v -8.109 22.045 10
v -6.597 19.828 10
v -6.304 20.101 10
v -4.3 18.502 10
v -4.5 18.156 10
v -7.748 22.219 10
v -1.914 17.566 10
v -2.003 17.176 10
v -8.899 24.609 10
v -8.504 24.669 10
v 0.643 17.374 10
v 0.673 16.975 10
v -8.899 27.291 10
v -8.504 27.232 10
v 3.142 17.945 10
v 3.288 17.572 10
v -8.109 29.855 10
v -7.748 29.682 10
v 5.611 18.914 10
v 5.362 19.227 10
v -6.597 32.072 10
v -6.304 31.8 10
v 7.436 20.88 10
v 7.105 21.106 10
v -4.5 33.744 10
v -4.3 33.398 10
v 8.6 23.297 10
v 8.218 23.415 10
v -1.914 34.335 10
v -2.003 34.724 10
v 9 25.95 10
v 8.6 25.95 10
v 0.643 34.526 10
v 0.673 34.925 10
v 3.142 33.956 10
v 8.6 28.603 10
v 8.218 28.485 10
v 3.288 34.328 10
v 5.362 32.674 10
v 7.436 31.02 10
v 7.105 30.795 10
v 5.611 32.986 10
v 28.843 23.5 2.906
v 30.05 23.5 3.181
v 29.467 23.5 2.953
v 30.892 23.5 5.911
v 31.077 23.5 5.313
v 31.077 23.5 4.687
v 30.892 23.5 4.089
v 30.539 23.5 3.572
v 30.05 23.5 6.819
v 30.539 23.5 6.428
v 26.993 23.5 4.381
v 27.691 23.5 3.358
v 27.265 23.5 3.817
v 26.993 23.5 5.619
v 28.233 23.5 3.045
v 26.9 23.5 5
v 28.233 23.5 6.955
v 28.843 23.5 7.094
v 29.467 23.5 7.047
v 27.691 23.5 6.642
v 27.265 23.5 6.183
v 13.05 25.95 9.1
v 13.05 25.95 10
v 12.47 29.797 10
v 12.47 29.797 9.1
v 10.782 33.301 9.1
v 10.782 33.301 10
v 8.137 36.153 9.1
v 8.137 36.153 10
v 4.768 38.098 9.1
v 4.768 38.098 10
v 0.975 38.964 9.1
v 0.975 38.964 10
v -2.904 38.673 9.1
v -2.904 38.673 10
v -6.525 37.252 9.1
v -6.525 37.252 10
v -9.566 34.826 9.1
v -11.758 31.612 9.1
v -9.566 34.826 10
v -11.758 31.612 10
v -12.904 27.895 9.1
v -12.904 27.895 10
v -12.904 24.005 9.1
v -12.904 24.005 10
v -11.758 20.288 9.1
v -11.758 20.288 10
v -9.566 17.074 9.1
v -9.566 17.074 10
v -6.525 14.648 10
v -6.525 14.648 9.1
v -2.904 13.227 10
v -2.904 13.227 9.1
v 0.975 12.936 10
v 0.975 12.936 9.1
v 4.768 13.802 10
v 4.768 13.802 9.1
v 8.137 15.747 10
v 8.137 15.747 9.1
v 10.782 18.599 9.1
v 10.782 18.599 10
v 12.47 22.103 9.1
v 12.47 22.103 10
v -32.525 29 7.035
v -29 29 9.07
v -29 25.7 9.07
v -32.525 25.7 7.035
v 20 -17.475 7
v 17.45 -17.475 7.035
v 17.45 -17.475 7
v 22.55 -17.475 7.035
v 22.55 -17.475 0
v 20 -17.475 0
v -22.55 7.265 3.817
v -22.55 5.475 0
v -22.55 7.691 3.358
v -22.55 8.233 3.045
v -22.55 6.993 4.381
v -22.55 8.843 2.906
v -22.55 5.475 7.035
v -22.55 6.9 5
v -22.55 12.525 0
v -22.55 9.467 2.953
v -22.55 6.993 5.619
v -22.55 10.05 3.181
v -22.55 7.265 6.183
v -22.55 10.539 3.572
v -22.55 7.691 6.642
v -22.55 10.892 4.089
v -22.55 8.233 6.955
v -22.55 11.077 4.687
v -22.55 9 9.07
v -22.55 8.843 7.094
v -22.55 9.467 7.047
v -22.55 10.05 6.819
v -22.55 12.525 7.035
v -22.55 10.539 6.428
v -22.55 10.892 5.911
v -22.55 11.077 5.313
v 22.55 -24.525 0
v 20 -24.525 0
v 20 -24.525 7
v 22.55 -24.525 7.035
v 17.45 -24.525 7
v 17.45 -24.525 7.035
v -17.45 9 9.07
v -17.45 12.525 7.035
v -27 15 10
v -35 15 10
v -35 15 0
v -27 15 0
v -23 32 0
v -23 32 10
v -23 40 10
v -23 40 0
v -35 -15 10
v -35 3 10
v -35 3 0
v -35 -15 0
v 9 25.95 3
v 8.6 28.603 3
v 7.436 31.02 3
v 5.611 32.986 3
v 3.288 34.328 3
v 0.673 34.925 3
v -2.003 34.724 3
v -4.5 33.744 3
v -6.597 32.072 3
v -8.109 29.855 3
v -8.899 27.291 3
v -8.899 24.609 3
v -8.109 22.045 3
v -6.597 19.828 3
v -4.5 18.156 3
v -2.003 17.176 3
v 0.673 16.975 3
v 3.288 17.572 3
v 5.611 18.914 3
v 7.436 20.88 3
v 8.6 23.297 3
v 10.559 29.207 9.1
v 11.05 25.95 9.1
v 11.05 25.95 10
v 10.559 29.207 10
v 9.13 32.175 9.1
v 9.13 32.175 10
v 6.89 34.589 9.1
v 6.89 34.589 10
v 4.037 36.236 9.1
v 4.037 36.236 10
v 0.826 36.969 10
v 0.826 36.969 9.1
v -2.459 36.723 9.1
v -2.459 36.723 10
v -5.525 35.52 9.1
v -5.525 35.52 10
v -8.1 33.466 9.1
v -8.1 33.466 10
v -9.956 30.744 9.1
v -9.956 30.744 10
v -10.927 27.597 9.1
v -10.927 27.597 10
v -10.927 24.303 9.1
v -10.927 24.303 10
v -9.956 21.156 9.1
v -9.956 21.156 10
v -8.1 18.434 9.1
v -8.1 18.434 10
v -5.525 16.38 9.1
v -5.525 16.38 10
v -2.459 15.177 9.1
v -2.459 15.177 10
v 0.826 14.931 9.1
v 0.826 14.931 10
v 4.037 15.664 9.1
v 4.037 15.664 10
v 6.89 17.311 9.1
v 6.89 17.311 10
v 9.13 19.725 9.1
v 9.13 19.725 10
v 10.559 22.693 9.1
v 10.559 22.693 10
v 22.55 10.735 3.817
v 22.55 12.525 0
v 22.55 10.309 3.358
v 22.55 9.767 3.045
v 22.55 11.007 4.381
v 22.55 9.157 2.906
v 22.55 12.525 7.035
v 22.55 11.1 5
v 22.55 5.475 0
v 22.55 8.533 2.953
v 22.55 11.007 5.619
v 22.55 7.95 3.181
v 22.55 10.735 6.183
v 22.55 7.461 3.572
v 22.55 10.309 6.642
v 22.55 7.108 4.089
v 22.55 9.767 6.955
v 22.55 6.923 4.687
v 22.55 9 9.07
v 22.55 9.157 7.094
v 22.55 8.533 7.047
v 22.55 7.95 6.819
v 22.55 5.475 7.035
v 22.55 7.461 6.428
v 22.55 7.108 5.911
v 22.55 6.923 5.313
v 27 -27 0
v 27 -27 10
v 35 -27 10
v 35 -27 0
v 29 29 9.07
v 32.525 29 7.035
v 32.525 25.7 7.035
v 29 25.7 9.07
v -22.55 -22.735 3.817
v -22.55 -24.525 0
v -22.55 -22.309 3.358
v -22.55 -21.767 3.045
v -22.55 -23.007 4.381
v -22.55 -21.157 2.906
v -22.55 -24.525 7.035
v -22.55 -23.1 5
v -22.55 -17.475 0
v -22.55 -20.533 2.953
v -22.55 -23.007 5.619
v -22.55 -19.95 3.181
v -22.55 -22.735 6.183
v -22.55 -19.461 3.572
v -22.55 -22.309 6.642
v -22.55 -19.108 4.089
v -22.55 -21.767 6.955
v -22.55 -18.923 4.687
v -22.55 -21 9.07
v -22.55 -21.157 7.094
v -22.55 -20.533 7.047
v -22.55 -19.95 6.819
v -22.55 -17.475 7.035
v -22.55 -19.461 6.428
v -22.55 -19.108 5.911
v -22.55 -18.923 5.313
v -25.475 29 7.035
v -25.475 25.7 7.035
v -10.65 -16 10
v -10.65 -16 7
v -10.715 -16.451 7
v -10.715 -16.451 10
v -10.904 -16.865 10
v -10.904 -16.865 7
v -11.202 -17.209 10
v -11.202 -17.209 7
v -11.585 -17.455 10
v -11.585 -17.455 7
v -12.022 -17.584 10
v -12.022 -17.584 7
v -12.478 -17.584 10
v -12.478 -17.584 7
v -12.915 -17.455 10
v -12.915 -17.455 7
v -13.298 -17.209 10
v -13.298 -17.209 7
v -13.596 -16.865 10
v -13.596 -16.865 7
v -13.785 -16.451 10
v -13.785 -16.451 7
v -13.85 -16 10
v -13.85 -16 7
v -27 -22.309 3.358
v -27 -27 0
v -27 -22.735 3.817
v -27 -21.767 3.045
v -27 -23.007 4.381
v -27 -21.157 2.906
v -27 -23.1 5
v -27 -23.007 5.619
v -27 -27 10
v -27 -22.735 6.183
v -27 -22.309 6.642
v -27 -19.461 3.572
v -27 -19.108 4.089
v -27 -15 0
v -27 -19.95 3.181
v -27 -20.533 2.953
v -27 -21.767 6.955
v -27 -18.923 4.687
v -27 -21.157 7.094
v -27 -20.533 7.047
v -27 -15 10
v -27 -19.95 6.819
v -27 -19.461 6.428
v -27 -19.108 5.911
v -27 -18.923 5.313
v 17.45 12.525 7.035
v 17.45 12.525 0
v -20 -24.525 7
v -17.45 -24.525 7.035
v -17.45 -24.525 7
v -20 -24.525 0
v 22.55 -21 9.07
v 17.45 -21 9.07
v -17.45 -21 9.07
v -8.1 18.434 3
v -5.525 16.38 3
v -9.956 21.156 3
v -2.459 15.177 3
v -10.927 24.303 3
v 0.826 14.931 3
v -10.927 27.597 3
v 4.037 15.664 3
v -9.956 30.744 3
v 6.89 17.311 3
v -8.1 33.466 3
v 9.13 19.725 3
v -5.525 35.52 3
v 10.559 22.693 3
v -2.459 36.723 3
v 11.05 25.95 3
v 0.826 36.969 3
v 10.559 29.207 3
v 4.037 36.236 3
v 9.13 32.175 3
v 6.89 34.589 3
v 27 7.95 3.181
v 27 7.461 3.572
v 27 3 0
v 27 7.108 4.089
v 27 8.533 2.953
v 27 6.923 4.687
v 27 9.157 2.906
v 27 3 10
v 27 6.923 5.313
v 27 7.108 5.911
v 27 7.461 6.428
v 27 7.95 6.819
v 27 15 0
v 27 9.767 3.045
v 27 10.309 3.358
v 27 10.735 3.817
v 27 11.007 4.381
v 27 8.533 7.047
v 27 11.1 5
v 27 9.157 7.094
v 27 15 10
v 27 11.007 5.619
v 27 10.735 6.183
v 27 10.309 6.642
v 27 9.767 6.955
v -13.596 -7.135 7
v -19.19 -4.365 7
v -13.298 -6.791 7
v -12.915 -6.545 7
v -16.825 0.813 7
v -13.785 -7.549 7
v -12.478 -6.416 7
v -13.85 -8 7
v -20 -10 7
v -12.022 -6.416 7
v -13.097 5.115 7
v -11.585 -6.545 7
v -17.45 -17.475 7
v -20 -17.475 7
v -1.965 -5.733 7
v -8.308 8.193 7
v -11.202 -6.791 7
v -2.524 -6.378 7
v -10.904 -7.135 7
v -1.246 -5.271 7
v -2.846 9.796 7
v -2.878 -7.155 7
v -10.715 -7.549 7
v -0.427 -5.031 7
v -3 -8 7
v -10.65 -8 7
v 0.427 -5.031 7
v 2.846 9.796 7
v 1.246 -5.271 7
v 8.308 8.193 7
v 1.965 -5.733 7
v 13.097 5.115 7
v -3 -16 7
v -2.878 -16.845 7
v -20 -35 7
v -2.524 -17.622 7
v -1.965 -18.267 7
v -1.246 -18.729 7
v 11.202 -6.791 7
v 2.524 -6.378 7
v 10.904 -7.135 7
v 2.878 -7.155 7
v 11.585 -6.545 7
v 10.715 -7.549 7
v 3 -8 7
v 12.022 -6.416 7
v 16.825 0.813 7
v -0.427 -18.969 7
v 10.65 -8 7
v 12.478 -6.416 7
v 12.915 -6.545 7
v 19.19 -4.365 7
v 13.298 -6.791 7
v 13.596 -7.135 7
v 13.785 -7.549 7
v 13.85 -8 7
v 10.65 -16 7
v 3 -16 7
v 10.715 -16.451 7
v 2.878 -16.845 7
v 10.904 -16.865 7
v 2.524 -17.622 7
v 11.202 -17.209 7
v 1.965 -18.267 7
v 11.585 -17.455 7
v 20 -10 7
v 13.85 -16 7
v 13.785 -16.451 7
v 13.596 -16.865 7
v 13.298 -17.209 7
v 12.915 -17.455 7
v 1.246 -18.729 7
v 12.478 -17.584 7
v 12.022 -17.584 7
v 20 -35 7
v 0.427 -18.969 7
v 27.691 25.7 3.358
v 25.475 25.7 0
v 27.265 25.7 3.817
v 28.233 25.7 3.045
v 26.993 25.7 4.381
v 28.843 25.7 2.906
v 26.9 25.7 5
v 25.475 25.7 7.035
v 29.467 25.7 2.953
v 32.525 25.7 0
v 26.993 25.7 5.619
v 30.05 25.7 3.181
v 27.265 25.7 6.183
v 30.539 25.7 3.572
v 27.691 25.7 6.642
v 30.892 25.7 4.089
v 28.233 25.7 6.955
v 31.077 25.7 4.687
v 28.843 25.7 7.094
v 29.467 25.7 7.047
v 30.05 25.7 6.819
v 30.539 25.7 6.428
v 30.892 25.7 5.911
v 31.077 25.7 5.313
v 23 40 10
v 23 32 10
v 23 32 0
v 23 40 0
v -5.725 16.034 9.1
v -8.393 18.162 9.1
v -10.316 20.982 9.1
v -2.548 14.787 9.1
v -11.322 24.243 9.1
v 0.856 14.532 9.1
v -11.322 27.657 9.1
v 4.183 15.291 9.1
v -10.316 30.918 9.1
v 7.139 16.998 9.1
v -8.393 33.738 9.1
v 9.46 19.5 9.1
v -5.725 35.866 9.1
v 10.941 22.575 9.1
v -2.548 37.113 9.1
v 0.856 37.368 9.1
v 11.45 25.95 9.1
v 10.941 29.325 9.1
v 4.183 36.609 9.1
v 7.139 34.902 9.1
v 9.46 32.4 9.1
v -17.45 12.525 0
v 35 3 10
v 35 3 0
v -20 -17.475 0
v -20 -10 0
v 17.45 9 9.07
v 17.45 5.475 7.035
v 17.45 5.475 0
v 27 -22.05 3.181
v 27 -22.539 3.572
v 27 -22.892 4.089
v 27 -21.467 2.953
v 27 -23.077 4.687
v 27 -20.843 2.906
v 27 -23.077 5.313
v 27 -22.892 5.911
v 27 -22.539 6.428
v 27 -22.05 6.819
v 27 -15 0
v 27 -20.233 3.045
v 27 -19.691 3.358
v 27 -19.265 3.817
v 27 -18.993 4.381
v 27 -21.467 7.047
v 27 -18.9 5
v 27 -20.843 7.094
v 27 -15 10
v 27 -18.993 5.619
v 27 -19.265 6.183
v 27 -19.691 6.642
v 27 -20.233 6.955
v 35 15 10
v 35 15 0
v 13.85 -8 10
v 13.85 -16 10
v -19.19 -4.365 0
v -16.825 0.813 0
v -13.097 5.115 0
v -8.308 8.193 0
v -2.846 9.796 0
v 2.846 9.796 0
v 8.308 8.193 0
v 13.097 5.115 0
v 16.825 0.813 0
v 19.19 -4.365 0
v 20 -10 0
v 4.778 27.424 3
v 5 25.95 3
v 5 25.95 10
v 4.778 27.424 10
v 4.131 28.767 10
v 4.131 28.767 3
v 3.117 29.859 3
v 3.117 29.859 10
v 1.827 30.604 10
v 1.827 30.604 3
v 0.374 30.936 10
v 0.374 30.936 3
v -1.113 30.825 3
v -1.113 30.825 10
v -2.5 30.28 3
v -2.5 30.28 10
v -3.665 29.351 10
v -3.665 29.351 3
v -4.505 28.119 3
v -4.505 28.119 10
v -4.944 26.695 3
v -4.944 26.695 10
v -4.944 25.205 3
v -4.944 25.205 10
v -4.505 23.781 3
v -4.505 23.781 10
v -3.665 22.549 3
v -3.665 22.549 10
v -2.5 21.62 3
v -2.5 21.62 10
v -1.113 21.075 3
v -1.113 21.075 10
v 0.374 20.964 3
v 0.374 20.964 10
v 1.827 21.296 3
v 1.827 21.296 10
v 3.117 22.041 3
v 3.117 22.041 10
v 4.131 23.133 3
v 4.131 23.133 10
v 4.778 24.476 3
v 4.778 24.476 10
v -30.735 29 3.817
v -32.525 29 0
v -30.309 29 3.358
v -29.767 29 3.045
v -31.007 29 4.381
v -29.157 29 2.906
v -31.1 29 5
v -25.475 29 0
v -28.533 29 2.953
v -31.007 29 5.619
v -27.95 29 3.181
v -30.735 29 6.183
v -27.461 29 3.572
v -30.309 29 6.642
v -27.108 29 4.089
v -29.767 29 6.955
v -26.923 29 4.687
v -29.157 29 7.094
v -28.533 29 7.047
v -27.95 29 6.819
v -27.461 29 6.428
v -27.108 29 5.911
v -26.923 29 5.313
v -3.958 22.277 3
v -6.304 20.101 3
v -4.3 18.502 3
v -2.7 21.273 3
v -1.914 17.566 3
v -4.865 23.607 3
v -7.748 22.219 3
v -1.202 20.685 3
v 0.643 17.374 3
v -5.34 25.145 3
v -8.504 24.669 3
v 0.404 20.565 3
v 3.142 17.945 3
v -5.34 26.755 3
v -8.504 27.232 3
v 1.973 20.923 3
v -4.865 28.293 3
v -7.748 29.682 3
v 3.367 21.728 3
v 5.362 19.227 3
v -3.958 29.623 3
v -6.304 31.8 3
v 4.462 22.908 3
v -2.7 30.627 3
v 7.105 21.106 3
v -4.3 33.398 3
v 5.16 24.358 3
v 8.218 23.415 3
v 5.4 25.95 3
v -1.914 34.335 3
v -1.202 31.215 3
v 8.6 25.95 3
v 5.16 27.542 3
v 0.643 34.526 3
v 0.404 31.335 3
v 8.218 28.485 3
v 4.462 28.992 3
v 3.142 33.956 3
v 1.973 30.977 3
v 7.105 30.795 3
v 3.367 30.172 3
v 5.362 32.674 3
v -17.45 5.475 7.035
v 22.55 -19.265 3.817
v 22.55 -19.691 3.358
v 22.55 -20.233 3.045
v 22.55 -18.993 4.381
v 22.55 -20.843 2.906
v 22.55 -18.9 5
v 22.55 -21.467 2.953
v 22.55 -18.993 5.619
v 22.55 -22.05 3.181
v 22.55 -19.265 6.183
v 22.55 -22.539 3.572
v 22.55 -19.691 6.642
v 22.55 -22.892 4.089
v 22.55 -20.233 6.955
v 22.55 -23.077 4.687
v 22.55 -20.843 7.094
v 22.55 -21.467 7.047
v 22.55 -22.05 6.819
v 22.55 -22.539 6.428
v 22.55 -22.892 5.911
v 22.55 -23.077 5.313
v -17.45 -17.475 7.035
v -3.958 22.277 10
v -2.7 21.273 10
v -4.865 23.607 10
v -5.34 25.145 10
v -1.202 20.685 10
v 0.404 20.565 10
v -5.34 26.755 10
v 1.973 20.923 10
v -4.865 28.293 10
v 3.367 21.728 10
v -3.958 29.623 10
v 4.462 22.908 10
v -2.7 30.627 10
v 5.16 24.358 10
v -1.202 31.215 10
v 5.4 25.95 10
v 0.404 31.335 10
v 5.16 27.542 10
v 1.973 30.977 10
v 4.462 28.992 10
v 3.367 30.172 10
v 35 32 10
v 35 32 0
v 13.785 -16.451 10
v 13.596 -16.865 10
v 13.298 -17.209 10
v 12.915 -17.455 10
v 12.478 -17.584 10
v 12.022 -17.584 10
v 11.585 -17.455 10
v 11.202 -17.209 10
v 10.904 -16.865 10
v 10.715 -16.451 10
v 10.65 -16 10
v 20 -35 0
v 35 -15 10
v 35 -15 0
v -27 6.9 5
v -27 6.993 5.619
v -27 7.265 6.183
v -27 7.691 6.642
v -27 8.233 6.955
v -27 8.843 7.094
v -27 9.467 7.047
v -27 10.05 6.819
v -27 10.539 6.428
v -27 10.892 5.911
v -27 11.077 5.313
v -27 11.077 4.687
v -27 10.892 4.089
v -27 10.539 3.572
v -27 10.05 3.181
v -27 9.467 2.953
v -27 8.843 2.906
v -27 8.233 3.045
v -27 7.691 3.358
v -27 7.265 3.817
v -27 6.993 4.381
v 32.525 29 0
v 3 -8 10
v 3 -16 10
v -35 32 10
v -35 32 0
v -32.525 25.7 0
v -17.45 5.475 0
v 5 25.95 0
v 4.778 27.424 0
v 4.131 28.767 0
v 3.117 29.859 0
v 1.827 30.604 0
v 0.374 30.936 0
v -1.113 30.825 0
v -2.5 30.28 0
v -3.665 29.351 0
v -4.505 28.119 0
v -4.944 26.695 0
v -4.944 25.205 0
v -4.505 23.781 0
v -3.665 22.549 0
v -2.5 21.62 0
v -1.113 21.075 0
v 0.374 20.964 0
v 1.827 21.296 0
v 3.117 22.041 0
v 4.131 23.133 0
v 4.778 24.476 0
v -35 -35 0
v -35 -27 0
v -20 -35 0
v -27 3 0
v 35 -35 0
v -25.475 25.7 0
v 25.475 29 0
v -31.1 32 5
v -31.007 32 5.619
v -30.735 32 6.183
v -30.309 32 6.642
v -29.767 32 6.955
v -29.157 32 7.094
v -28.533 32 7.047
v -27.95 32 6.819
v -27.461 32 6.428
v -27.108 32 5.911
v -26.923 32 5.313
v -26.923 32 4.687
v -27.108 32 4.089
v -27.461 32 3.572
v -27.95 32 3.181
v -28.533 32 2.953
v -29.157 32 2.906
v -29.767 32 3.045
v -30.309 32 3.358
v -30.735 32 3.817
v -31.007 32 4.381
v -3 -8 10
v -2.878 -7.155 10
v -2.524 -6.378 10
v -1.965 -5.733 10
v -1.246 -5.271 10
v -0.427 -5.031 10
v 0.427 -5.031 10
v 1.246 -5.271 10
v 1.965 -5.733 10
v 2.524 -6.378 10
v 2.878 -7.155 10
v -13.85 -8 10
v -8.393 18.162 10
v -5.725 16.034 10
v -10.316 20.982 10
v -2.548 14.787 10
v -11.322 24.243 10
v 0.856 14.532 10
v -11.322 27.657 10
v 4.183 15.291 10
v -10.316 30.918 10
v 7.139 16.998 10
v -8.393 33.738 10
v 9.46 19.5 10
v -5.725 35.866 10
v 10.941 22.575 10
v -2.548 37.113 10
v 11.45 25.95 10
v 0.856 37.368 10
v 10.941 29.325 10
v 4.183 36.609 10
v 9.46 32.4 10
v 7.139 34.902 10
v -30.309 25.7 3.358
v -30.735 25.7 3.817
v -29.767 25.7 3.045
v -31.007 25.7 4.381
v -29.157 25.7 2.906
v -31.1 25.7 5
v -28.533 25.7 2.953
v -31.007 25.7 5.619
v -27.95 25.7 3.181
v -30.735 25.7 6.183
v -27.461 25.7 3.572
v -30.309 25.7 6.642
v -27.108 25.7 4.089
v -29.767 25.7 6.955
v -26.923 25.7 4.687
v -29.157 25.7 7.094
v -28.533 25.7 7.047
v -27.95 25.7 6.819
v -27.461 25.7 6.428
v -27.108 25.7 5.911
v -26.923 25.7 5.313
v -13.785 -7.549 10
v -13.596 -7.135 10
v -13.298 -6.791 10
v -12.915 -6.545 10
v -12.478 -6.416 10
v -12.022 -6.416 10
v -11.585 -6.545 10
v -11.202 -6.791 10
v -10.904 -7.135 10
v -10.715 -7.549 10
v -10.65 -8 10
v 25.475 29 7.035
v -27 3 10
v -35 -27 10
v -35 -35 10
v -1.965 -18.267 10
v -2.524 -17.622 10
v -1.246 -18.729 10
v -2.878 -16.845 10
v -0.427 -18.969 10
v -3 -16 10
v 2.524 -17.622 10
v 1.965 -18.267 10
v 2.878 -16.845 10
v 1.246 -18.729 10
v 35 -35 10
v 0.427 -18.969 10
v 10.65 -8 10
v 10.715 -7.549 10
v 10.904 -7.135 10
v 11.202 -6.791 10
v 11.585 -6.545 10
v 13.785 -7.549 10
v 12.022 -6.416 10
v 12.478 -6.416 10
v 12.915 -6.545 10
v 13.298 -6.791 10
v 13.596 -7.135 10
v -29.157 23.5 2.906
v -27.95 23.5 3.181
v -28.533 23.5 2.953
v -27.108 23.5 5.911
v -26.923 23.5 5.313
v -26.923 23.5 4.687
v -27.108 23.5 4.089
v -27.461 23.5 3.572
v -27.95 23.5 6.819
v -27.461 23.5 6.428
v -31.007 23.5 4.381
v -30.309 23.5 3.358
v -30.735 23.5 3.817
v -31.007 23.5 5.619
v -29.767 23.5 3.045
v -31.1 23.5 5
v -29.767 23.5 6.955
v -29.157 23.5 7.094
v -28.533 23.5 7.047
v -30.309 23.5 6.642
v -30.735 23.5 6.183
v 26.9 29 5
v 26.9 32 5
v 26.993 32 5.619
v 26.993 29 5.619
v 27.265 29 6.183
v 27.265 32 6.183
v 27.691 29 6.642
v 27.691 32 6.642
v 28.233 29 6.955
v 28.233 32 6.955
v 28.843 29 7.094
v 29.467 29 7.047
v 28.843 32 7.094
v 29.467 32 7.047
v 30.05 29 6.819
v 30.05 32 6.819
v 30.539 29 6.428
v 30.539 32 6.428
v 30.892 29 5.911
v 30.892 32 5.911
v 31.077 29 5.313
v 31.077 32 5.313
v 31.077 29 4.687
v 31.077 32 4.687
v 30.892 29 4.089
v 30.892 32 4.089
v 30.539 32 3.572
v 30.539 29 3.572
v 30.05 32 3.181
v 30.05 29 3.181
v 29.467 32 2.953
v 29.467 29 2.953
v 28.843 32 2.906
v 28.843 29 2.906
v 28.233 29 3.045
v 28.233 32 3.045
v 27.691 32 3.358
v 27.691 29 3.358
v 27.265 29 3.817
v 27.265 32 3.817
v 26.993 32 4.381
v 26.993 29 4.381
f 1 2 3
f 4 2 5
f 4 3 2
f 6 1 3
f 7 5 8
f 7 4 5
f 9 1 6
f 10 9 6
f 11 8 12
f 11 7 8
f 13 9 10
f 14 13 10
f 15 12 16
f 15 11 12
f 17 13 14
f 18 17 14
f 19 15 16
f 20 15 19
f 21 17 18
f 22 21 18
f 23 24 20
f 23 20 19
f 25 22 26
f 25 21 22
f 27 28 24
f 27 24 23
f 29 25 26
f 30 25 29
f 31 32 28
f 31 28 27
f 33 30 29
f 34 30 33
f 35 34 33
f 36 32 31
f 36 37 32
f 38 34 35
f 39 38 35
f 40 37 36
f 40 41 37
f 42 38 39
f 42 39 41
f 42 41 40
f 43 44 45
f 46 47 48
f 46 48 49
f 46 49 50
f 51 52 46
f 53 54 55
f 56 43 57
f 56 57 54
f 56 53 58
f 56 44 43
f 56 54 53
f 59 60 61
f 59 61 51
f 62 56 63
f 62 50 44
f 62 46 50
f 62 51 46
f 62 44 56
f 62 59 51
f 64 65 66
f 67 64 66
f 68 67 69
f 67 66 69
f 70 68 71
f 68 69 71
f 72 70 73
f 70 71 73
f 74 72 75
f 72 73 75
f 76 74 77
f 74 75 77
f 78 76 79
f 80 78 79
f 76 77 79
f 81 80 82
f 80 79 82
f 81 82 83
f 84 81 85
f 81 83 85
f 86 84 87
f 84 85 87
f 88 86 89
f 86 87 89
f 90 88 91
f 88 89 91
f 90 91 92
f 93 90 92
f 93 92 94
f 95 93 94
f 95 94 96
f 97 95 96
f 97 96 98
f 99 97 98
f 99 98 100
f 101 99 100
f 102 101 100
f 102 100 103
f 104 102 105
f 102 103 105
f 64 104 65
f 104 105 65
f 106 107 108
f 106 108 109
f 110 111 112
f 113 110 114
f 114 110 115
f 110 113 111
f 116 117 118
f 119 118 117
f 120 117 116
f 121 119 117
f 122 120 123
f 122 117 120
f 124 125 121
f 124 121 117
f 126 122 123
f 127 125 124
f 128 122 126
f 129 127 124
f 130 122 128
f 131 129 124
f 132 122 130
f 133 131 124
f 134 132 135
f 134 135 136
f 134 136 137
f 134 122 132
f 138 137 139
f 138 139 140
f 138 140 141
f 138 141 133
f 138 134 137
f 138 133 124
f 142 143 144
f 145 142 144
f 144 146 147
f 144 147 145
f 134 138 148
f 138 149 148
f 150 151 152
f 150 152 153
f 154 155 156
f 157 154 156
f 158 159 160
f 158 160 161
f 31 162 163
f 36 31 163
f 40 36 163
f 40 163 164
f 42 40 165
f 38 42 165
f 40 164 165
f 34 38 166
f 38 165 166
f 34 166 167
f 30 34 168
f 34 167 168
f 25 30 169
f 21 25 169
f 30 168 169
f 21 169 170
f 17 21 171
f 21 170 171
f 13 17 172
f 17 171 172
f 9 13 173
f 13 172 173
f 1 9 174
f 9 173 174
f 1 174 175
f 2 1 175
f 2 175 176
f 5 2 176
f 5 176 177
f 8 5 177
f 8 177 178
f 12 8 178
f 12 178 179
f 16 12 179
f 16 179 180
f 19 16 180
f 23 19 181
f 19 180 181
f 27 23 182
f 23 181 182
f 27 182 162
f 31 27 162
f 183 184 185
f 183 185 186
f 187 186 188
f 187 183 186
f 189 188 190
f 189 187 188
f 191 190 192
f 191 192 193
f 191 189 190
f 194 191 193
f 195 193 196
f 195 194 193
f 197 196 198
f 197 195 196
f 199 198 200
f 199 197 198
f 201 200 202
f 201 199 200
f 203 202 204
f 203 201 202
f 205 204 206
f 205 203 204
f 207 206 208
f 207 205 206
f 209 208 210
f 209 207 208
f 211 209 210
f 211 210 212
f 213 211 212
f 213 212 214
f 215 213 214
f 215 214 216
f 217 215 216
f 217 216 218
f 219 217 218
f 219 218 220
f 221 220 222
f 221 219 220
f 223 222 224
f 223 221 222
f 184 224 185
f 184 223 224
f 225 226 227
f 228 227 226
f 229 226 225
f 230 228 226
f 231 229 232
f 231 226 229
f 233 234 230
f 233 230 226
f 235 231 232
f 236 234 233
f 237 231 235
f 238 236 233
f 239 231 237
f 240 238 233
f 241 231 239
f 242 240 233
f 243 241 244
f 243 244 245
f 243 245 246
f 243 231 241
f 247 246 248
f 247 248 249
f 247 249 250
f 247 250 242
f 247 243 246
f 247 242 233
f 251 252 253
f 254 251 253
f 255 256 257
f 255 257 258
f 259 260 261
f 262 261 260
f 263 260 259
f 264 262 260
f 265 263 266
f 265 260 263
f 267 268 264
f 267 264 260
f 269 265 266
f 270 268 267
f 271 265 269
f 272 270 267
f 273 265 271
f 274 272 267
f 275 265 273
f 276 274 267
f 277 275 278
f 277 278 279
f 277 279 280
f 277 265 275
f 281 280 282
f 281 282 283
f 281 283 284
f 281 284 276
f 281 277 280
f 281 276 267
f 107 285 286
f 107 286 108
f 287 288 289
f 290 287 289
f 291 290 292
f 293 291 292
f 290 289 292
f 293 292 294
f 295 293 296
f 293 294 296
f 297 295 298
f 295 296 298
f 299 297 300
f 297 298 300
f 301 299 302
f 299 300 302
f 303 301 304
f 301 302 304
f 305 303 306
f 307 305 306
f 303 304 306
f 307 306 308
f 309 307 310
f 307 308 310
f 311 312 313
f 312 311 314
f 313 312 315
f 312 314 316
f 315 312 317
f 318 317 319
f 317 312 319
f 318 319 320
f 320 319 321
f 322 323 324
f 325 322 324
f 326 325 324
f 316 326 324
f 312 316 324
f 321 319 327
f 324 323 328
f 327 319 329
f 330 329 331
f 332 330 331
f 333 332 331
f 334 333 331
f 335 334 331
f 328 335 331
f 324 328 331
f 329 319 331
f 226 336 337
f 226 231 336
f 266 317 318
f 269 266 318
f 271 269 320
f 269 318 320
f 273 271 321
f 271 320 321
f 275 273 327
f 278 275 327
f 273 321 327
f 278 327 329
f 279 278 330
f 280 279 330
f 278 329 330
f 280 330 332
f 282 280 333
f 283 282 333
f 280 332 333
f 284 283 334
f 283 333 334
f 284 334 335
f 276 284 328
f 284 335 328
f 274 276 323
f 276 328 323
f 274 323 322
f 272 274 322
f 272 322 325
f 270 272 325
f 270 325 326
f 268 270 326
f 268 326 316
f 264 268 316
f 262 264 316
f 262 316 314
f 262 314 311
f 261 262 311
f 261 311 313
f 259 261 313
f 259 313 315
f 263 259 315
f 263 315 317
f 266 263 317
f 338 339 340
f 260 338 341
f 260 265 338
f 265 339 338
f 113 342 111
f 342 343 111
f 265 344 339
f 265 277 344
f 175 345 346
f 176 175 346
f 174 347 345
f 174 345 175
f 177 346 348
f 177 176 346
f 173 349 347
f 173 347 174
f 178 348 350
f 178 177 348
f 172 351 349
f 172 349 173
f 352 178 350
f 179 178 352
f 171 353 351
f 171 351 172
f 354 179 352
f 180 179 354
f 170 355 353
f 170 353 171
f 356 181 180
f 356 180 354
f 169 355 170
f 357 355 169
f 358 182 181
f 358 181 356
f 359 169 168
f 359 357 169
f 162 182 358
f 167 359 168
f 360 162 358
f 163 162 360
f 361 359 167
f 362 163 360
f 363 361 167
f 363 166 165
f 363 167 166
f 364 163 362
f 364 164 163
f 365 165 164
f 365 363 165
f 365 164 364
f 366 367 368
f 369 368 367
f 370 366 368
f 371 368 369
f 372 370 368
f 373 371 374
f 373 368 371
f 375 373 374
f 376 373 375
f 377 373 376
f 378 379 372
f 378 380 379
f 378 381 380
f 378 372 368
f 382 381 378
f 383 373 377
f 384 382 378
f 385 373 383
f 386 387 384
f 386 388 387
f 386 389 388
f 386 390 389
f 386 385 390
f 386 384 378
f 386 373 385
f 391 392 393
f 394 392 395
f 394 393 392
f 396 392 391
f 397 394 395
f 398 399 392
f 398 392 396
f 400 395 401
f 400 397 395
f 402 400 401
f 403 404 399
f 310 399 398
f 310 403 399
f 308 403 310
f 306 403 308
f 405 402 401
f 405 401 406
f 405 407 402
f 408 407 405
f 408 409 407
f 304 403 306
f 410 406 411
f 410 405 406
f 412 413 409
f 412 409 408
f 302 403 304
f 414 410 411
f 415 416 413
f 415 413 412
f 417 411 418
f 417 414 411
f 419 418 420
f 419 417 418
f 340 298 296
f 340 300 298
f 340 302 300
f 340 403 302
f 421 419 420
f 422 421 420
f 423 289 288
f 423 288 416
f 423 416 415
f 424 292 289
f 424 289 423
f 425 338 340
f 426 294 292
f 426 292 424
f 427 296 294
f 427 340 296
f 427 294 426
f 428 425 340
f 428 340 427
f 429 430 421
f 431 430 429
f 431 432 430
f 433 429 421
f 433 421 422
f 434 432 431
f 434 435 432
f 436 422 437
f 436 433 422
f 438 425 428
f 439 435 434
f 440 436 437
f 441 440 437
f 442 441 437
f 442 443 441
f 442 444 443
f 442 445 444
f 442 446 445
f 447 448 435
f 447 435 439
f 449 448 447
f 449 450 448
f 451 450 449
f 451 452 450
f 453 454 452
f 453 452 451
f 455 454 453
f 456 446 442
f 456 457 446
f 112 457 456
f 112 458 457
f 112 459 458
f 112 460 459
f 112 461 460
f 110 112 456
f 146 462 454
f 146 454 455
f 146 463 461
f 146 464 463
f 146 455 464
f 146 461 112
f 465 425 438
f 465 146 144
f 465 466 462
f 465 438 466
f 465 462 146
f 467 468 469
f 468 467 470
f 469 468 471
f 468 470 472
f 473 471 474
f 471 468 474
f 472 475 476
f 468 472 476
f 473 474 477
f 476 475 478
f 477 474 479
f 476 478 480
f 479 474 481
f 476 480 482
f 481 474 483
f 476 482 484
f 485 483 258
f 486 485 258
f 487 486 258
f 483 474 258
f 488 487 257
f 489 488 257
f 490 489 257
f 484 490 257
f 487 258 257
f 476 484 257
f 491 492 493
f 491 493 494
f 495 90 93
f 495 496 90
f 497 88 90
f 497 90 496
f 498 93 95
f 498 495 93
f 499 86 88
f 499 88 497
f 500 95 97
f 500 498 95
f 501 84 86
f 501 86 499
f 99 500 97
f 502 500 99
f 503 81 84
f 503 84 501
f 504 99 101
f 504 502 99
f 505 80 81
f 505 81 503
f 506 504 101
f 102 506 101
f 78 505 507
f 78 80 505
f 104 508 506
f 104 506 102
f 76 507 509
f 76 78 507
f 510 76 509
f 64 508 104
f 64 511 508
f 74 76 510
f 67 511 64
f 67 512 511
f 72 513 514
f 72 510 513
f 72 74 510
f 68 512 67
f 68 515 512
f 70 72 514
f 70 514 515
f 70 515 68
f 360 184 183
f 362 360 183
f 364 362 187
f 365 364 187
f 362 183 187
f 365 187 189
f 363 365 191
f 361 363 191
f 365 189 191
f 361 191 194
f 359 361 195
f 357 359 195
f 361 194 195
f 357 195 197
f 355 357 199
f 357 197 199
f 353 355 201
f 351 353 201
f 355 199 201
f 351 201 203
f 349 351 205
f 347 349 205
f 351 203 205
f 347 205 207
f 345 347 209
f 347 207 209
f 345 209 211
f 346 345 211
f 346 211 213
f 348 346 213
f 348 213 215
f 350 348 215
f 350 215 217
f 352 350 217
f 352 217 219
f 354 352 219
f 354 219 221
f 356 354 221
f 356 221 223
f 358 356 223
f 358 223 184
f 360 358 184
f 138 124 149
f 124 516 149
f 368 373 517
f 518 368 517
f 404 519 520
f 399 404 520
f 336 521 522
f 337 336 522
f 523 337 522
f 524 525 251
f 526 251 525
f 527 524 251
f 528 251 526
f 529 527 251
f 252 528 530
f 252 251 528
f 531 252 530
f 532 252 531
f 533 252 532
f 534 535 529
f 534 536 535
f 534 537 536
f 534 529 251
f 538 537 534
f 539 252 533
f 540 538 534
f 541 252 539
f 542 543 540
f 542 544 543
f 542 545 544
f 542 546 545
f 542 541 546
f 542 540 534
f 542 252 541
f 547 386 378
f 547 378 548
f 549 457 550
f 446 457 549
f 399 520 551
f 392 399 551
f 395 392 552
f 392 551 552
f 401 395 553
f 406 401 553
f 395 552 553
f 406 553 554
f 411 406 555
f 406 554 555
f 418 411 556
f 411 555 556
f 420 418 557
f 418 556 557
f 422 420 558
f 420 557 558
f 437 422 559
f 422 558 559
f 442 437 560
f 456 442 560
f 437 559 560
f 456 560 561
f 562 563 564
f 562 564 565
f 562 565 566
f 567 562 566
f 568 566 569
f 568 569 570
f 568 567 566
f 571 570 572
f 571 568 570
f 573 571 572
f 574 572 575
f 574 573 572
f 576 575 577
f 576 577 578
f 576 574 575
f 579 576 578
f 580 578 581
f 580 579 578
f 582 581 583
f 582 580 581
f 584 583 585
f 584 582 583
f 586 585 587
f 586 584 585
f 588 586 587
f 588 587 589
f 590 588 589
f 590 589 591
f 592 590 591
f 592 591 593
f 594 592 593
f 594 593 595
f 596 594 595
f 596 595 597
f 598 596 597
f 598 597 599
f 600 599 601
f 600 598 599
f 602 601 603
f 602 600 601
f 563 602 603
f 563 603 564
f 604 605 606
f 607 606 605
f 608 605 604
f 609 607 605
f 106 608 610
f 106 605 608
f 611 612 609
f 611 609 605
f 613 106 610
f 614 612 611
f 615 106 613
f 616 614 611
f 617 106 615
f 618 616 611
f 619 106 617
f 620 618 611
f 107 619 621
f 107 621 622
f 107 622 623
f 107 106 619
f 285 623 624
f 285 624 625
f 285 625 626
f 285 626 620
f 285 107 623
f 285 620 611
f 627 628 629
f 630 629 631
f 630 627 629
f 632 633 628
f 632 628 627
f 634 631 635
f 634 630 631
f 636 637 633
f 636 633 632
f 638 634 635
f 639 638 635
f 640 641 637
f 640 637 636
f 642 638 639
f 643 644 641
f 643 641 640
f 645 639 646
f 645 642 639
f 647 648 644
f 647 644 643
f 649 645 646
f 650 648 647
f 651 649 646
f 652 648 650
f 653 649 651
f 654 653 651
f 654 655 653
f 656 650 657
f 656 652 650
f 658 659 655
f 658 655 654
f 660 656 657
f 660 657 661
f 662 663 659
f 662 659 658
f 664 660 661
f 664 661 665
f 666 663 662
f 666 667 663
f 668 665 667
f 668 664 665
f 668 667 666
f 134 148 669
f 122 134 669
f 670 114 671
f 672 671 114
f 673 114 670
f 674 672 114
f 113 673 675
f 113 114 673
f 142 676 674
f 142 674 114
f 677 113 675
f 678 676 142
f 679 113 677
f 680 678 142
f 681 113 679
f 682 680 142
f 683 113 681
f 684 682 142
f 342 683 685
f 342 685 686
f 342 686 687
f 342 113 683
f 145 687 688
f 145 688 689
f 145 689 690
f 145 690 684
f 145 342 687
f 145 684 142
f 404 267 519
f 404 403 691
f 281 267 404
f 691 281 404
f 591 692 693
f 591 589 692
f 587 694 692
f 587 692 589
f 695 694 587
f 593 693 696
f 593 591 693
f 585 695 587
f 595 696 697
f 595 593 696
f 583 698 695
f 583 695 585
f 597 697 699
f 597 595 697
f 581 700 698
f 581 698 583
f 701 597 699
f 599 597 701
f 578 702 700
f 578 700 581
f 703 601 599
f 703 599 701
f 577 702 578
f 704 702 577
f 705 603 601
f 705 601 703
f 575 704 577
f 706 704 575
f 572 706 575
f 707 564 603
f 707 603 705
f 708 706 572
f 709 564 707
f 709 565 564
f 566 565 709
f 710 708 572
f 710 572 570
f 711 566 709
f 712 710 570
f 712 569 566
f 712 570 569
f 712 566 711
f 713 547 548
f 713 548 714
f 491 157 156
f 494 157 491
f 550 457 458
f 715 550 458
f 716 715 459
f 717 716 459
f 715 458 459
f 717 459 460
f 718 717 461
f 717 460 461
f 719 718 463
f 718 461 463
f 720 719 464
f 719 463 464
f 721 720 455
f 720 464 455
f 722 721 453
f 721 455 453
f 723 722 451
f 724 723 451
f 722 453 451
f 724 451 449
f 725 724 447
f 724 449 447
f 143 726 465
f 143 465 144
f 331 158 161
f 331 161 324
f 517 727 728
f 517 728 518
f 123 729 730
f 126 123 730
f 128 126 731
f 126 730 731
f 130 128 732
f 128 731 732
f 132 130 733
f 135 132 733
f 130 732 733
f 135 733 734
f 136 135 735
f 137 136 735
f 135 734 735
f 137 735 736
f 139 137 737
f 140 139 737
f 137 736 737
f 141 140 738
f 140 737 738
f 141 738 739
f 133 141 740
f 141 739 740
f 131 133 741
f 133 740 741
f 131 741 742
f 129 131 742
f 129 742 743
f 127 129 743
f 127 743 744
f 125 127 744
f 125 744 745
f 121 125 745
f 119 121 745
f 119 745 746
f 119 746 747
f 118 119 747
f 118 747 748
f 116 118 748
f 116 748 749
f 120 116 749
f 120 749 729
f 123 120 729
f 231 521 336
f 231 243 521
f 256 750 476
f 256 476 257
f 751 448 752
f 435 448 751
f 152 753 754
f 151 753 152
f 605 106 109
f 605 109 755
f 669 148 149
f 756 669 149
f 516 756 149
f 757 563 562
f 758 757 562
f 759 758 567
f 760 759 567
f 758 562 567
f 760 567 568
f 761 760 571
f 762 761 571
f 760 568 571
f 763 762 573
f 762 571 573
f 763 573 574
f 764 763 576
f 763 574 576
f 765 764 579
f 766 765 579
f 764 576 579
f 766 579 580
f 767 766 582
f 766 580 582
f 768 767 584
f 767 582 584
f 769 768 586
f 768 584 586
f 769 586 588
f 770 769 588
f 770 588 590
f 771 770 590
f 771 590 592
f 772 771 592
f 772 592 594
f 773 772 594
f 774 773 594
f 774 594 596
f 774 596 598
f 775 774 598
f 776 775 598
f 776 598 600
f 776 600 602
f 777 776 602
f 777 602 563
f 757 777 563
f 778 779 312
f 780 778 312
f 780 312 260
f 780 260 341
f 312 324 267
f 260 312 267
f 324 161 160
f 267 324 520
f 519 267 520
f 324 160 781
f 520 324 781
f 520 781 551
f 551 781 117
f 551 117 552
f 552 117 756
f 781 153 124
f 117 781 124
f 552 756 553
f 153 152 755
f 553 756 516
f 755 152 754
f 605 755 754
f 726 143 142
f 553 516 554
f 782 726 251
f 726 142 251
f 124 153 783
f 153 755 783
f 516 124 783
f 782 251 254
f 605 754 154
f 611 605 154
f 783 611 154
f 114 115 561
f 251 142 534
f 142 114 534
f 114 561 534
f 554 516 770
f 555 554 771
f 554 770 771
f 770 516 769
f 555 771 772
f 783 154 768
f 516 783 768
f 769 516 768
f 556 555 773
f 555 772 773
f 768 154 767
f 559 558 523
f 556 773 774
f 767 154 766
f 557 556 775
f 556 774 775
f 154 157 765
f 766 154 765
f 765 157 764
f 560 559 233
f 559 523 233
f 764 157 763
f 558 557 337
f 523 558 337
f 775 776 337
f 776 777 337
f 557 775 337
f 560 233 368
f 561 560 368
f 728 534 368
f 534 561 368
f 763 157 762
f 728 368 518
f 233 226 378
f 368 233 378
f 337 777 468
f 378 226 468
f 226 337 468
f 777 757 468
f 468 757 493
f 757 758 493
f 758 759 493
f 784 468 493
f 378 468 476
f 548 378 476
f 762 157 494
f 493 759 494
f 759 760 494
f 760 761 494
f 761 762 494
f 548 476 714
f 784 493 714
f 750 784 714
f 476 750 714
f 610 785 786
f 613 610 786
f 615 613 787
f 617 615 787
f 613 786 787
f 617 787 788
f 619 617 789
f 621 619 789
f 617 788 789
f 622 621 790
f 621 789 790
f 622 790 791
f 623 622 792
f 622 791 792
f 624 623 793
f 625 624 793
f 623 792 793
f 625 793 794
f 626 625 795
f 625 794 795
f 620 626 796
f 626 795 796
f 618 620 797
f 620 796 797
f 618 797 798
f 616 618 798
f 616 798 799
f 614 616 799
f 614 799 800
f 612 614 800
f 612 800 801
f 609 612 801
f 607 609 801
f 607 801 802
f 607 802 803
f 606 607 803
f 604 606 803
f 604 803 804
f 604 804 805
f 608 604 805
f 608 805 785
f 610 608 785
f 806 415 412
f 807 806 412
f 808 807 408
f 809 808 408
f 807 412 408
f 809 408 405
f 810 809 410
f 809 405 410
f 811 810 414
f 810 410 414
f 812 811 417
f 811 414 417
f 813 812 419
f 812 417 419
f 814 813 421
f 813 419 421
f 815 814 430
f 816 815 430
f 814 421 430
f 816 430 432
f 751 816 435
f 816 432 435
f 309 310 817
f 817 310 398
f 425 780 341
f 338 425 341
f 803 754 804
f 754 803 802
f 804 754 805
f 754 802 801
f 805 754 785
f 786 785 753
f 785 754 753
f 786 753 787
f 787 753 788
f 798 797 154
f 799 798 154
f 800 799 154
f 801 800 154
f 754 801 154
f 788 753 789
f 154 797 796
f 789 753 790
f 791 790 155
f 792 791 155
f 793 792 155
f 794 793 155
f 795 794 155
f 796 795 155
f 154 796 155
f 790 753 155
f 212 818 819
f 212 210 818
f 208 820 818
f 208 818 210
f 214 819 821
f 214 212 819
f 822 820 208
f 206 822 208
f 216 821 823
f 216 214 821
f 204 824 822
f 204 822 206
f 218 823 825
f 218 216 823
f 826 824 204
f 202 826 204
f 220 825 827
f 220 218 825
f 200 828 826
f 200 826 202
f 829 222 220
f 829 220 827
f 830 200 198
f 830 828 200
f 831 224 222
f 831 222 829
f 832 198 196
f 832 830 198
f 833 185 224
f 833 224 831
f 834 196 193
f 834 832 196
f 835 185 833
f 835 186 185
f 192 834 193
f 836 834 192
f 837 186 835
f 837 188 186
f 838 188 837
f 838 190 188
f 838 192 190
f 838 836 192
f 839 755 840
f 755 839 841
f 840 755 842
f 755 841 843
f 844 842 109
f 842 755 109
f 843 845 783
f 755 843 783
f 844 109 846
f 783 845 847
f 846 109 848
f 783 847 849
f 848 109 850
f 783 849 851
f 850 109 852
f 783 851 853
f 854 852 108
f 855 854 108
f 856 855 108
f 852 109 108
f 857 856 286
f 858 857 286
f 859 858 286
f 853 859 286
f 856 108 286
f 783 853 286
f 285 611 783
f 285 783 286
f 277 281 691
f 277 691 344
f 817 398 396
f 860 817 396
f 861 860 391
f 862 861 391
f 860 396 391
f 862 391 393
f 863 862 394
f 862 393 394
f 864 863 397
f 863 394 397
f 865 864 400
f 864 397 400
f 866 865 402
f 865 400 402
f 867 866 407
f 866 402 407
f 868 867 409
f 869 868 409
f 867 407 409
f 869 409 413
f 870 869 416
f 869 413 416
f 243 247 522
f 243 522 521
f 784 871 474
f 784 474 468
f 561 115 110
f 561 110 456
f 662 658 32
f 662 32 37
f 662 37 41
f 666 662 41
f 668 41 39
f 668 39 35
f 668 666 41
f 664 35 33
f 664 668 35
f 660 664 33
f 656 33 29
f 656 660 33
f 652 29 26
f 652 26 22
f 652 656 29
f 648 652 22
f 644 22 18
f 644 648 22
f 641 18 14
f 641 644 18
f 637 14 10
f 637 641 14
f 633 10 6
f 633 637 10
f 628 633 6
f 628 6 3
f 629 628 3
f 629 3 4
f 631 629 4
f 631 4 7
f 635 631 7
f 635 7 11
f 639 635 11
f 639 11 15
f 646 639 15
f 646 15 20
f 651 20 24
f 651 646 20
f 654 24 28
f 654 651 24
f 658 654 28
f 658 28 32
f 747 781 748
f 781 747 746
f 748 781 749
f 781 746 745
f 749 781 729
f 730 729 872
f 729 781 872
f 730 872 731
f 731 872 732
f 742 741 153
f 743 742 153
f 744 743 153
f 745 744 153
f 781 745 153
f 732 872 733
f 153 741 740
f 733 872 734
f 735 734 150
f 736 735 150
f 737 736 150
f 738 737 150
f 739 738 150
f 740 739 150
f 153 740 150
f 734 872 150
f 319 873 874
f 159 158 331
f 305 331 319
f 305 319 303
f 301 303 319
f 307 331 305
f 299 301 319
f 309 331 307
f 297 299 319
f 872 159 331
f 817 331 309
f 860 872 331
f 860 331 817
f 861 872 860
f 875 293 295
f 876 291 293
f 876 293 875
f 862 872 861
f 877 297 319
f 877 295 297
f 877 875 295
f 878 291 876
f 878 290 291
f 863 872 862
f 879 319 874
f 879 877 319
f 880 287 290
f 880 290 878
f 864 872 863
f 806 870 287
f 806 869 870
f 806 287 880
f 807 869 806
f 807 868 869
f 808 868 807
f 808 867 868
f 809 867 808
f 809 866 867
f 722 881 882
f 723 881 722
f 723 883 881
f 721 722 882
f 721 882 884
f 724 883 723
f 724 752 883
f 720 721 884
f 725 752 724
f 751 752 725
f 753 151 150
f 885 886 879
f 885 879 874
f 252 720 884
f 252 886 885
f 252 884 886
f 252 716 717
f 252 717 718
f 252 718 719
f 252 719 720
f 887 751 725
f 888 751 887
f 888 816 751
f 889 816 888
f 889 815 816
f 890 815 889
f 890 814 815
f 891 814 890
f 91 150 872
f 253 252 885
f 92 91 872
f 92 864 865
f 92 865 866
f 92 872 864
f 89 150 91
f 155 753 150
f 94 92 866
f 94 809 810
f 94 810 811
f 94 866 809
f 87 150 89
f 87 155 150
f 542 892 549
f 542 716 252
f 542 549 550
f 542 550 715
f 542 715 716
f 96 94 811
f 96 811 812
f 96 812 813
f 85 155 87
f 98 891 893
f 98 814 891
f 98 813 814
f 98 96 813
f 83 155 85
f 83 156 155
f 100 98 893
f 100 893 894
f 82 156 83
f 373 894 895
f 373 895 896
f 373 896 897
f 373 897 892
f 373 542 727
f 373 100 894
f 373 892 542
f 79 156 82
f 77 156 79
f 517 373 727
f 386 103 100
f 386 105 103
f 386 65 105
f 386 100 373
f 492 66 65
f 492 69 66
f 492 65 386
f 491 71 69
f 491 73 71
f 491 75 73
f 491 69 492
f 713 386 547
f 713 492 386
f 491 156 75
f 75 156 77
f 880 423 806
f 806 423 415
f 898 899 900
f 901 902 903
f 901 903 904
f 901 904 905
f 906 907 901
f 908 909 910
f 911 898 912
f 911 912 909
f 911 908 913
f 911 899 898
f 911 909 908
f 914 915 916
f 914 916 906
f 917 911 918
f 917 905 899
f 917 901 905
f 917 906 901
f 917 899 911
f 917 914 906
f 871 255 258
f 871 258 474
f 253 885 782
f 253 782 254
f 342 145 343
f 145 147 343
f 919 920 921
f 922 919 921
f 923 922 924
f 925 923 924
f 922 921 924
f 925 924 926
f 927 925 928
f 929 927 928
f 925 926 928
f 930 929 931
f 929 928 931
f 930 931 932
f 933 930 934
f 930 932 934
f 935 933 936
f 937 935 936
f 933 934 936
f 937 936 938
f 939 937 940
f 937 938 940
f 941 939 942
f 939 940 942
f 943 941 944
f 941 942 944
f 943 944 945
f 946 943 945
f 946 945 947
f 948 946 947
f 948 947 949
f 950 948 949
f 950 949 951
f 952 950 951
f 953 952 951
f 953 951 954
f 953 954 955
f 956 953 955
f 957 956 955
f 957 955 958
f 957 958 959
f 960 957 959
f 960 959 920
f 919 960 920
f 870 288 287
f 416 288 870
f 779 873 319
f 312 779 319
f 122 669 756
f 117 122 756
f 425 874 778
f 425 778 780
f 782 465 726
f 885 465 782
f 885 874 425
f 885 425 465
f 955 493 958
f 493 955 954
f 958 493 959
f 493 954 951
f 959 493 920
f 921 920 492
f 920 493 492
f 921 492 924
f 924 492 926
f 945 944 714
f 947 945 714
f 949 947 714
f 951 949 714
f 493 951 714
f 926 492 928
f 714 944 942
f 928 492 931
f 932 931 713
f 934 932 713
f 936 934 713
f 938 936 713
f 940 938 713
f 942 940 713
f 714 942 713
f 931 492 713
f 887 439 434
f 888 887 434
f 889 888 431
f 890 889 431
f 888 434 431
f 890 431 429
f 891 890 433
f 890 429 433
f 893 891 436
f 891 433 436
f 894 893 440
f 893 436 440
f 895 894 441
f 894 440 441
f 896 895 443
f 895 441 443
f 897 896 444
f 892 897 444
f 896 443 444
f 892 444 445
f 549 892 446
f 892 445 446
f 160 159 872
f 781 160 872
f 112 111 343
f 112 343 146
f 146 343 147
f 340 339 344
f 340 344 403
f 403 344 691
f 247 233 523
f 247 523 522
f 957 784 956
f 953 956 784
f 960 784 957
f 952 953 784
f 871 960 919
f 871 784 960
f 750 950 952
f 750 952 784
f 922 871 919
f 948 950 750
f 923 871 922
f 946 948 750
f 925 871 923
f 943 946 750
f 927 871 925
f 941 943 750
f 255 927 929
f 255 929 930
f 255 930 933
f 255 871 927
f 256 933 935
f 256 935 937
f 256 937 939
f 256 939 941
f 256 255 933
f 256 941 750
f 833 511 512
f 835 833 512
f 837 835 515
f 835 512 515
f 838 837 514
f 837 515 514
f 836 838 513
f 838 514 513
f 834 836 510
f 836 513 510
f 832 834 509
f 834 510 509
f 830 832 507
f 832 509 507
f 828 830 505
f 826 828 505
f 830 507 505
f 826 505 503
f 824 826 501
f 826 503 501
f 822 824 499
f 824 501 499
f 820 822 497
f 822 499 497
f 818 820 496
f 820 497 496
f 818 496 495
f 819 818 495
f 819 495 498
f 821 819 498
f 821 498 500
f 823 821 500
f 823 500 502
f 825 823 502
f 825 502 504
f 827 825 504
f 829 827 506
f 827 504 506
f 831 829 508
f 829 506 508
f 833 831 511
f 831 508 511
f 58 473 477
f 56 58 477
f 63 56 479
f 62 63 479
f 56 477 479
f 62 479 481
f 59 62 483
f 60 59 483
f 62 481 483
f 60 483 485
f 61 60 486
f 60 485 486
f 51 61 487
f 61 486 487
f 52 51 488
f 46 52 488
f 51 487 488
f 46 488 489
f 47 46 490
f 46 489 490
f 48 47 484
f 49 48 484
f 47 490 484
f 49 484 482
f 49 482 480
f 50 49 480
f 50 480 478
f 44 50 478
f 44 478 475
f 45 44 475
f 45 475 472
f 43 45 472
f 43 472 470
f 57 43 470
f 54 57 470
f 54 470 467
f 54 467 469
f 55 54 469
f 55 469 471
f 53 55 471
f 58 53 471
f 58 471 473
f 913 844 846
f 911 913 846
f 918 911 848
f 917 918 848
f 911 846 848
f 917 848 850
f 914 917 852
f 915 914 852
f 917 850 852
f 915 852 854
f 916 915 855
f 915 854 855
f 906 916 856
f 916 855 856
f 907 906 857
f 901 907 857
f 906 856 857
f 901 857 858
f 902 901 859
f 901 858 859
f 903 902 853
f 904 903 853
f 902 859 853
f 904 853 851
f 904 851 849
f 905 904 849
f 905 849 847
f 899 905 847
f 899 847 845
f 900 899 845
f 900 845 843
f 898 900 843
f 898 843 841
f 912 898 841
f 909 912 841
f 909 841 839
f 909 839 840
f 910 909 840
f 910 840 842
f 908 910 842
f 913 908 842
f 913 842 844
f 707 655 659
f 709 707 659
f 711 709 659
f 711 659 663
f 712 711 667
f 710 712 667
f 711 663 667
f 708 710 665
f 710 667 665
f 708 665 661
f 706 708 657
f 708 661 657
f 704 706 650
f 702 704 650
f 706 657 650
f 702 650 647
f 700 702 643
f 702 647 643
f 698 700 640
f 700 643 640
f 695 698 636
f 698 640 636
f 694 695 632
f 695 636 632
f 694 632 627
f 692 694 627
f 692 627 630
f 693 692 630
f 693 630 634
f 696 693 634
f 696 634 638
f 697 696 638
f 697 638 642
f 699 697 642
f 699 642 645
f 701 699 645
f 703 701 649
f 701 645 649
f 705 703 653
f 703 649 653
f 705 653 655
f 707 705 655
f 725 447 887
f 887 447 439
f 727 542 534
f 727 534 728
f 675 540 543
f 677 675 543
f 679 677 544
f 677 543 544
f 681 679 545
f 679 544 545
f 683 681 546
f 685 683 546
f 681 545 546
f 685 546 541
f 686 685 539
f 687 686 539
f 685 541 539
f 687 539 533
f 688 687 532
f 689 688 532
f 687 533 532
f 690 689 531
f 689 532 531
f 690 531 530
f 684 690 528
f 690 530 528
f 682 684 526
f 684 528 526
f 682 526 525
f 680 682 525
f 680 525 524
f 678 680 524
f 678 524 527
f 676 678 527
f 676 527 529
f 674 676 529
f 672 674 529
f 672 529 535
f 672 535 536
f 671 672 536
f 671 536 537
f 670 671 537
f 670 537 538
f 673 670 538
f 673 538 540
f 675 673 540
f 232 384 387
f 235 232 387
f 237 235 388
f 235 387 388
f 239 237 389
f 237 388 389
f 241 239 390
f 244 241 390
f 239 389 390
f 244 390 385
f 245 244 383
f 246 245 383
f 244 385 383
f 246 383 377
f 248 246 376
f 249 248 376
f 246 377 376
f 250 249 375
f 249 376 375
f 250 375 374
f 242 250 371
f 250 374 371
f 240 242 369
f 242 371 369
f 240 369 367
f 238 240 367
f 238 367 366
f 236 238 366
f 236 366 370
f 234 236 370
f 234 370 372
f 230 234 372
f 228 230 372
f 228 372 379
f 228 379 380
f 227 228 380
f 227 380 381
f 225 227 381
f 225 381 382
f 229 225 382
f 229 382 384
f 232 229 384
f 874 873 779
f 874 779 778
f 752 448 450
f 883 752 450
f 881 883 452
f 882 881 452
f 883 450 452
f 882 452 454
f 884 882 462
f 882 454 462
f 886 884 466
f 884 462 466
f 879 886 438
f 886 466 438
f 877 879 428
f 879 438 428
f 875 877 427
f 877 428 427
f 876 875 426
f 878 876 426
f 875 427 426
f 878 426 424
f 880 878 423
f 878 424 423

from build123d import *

# Parameters (mm, degrees)
PAD001_DEPTH    = 3.3
SKETCH_W        = 80
SKETCH_H        = 80
PAD_DEPTH       = 10
SKETCH001_R     = 11.05
POCKET_DEPTH    = 7
SKETCH002_R     = 5
POCKET001_DEPTH = 3.001
SKETCH003_R     = 13.05
POCKET002_DEPTH = 0.9
POCKET003_DEPTH = 7
POCKET004_DEPTH = 3.001
POCKET005_DEPTH = 10.001
SKETCH009_W     = 8
SKETCH009_H     = 12
SKETCH009_W_2   = 12
SKETCH009_H_2   = 8
POCKET008_DEPTH = 10.001
SKETCH010_R     = 2.1
POCKET009_DEPTH = 9
SKETCH011_R     = 2.1
POCKET010_DEPTH = 9
SKETCH012_R     = 2.1
POCKET011_DEPTH = 8.5
POCKET012_DEPTH = 2.55
POCKET013_DEPTH = 2.55
SKETCH017_R     = 5.4
SKETCH017_R_2   = 5
PAD002_DEPTH    = 7
SKETCH018_R     = 11.45
SKETCH018_R_2   = 11.05
PAD003_DEPTH    = 0.9
SKETCH019_R     = 9
SKETCH019_R_2   = 8.6
PAD004_DEPTH    = 7


with BuildPart() as pad001:
    # Sketch016 → Pad001 (new body)
    with BuildSketch(Plane.XZ.offset(-29)):
        Polygon((-25.475, 7.03516), (-29, 9.070319), (-32.525, 7.03516), (-32.525, 2.96484), (-32.525, 0), (-25.475, 0), align=None)
        Polygon((32.525, 7.03516), (29, 9.070319), (25.475, 7.03516), (25.475, 2.96484), (25.475, 0), (32.525, 0), align=None)
    extrude(amount=PAD001_DEPTH)


with BuildPart() as halter_fraesspindel_top_druckbar:
    # Sketch → Pad (new body)
    with BuildSketch(Plane.XY):
        Rectangle(SKETCH_W, SKETCH_H)
    extrude(amount=PAD_DEPTH)

    # Sketch001 → Pocket (cut)
    with BuildSketch(Plane.XY.offset(10)):
        with Locations((0, 25.95)):
            Circle(SKETCH001_R)
    extrude(amount=-POCKET_DEPTH, mode=Mode.SUBTRACT)

    # Sketch002 → Pocket001 (cut, through all)
    with BuildSketch(Plane.XY.offset(3)):
        with Locations((0, 25.95)):
            Circle(SKETCH002_R)
    extrude(amount=-POCKET001_DEPTH, mode=Mode.SUBTRACT)

    # Sketch003 → Pocket002 (cut)
    with BuildSketch(Plane.XY.offset(10)):
        with Locations((0, 25.95)):
            Circle(SKETCH003_R)
    extrude(amount=-POCKET002_DEPTH, mode=Mode.SUBTRACT)

    # Sketch004 → Pocket003 (cut)
    with BuildSketch(Plane(origin=(0, 0, 0), x_dir=(1, 0, 0), z_dir=(0, 0, -1))):
        with BuildLine():
            ThreePointArc((-20, 10), (0, -10), (20, 10))
            Line((20, 40), (20, 10))
            Line((20, 40), (-20, 40))
            Line((-20, 40), (-20, 10))
        make_face()
    extrude(amount=-POCKET003_DEPTH, mode=Mode.SUBTRACT)

    # Sketch005 → Pocket004 (cut, through all)
    with BuildSketch(Plane(origin=(0, 0, 7), x_dir=(1, 0, 0), z_dir=(0, 0, -1))):
        with BuildLine():
            ThreePointArc((3, 16), (0, 19), (-3, 16))
            Line((-3, 16), (-3, 8))
            ThreePointArc((-3, 8), (0, 5), (3, 8))
            Line((3, 16), (3, 8))
        make_face()
        with BuildLine():
            ThreePointArc((13.85, 16), (12.25, 17.6), (10.65, 16))
            Line((10.65, 16), (10.65, 8))
            ThreePointArc((10.65, 8), (12.25, 6.4), (13.85, 8))
            Line((13.85, 16), (13.85, 8))
        make_face()
        with BuildLine():
            ThreePointArc((-10.65, 16), (-12.25, 17.6), (-13.85, 16))
            Line((-13.85, 16), (-13.85, 8))
            ThreePointArc((-13.85, 8), (-12.25, 6.4), (-10.65, 8))
            Line((-10.65, 16), (-10.65, 8))
        make_face()
    extrude(amount=-POCKET004_DEPTH, mode=Mode.SUBTRACT)

    # Sketch006 → Pocket005 (cut, through all)
    with BuildSketch(Plane.XY.offset(10)):
        Polygon((-40, 40), (-35, 40), (-35, -35), (35, -35), (35, 40), (40, 40), (40, -40), (35, -40), (-35, -40), (-40, -40), align=None)
    extrude(amount=-POCKET005_DEPTH, mode=Mode.SUBTRACT)

    # Sketch009 → Pocket008 (cut, through all)
    with BuildSketch(Plane.XY.offset(10)):
        with Locations((-31, 9)):
            Rectangle(SKETCH009_W, SKETCH009_H)
        with Locations((31, 9)):
            Rectangle(SKETCH009_W, SKETCH009_H)
        with Locations((-31, -21)):
            Rectangle(SKETCH009_W, SKETCH009_H)
        with Locations((31, -21)):
            Rectangle(SKETCH009_W, SKETCH009_H)
        with Locations((-29, 36)):
            Rectangle(SKETCH009_W_2, SKETCH009_H_2)
        with Locations((29, 36)):
            Rectangle(SKETCH009_W_2, SKETCH009_H_2)
    extrude(amount=-POCKET008_DEPTH, mode=Mode.SUBTRACT)

    # Sketch010 → Pocket009 (cut)
    with BuildSketch(Plane(origin=(-27, 0, 0), x_dir=(0, -1, 0), z_dir=(-1, 0, 0))):
        with Locations((-9, 5)):
            Circle(SKETCH010_R)
        with Locations((21, 5)):
            Circle(SKETCH010_R)
    extrude(amount=-POCKET009_DEPTH, mode=Mode.SUBTRACT)

    # Sketch011 → Pocket010 (cut)
    with BuildSketch(Plane.YZ.offset(27)):
        with Locations((-21, 5)):
            Circle(SKETCH011_R)
        with Locations((9, 5)):
            Circle(SKETCH011_R)
    extrude(amount=-POCKET010_DEPTH, mode=Mode.SUBTRACT)

    # Sketch012 → Pocket011 (cut)
    with BuildSketch(Plane(origin=(0, 32, 0), x_dir=(-1, 0, 0), z_dir=(0, 1, 0))):
        with Locations((-29, 5)):
            Circle(SKETCH012_R)
        with Locations((29, 5)):
            Circle(SKETCH012_R)
    extrude(amount=-POCKET011_DEPTH, mode=Mode.SUBTRACT)

    # Sketch013 → Pocket012 (cut, symmetric)
    with BuildSketch(Plane(origin=(20, 0, 0), x_dir=(0, -1, 0), z_dir=(-1, 0, 0))):
        Polygon((-5.475, 7.03516), (-9, 9.070319), (-12.525, 7.03516), (-12.525, 2.96484), (-12.525, 0), (-5.475, 0), align=None)
        Polygon((21, 9.070319), (17.475, 7.03516), (17.475, 2.96484), (17.475, 0), (24.525, 0), (24.525, 2.96484), (24.525, 7.03516), align=None)
    extrude(amount=POCKET012_DEPTH, both=True, mode=Mode.SUBTRACT)

    # Sketch014 → Pocket013 (cut, symmetric)
    with BuildSketch(Plane.YZ.offset(-20)):
        Polygon((-17.475, 7.03516), (-21, 9.070319), (-24.525, 7.03516), (-24.525, 2.96484), (-24.525, 0), (-17.475, 0), align=None)
        Polygon((12.525, 7.03516), (9, 9.070319), (5.475, 7.03516), (5.475, 2.96484), (5.475, 0), (12.525, 0), align=None)
    extrude(amount=POCKET013_DEPTH, both=True, mode=Mode.SUBTRACT)

    # Cut: cut Pad001
    add(pad001.part, mode=Mode.SUBTRACT)

    # Sketch017 → Pad002 (new body)
    with BuildSketch(Plane.XY.offset(3)):
        with Locations((0, 25.95)):
            Circle(SKETCH017_R)
        with Locations((0, 25.95)):
            Circle(SKETCH017_R_2, mode=Mode.SUBTRACT)
    extrude(amount=PAD002_DEPTH)

    # Sketch018 → Pad003 (new body)
    with BuildSketch(Plane.XY.offset(9.1)):
        with Locations((0, 25.95)):
            Circle(SKETCH018_R)
        with Locations((0, 25.95)):
            Circle(SKETCH018_R_2, mode=Mode.SUBTRACT)
    extrude(amount=PAD003_DEPTH)

    # Sketch019 → Pad004 (new body)
    with BuildSketch(Plane.XY.offset(3)):
        with Locations((0, 25.95)):
            Circle(SKETCH019_R)
        with Locations((-0.000162, 25.950293)):
            Circle(SKETCH019_R_2, mode=Mode.SUBTRACT)
    extrude(amount=PAD004_DEPTH)


solid = halter_fraesspindel_top_druckbar.part
